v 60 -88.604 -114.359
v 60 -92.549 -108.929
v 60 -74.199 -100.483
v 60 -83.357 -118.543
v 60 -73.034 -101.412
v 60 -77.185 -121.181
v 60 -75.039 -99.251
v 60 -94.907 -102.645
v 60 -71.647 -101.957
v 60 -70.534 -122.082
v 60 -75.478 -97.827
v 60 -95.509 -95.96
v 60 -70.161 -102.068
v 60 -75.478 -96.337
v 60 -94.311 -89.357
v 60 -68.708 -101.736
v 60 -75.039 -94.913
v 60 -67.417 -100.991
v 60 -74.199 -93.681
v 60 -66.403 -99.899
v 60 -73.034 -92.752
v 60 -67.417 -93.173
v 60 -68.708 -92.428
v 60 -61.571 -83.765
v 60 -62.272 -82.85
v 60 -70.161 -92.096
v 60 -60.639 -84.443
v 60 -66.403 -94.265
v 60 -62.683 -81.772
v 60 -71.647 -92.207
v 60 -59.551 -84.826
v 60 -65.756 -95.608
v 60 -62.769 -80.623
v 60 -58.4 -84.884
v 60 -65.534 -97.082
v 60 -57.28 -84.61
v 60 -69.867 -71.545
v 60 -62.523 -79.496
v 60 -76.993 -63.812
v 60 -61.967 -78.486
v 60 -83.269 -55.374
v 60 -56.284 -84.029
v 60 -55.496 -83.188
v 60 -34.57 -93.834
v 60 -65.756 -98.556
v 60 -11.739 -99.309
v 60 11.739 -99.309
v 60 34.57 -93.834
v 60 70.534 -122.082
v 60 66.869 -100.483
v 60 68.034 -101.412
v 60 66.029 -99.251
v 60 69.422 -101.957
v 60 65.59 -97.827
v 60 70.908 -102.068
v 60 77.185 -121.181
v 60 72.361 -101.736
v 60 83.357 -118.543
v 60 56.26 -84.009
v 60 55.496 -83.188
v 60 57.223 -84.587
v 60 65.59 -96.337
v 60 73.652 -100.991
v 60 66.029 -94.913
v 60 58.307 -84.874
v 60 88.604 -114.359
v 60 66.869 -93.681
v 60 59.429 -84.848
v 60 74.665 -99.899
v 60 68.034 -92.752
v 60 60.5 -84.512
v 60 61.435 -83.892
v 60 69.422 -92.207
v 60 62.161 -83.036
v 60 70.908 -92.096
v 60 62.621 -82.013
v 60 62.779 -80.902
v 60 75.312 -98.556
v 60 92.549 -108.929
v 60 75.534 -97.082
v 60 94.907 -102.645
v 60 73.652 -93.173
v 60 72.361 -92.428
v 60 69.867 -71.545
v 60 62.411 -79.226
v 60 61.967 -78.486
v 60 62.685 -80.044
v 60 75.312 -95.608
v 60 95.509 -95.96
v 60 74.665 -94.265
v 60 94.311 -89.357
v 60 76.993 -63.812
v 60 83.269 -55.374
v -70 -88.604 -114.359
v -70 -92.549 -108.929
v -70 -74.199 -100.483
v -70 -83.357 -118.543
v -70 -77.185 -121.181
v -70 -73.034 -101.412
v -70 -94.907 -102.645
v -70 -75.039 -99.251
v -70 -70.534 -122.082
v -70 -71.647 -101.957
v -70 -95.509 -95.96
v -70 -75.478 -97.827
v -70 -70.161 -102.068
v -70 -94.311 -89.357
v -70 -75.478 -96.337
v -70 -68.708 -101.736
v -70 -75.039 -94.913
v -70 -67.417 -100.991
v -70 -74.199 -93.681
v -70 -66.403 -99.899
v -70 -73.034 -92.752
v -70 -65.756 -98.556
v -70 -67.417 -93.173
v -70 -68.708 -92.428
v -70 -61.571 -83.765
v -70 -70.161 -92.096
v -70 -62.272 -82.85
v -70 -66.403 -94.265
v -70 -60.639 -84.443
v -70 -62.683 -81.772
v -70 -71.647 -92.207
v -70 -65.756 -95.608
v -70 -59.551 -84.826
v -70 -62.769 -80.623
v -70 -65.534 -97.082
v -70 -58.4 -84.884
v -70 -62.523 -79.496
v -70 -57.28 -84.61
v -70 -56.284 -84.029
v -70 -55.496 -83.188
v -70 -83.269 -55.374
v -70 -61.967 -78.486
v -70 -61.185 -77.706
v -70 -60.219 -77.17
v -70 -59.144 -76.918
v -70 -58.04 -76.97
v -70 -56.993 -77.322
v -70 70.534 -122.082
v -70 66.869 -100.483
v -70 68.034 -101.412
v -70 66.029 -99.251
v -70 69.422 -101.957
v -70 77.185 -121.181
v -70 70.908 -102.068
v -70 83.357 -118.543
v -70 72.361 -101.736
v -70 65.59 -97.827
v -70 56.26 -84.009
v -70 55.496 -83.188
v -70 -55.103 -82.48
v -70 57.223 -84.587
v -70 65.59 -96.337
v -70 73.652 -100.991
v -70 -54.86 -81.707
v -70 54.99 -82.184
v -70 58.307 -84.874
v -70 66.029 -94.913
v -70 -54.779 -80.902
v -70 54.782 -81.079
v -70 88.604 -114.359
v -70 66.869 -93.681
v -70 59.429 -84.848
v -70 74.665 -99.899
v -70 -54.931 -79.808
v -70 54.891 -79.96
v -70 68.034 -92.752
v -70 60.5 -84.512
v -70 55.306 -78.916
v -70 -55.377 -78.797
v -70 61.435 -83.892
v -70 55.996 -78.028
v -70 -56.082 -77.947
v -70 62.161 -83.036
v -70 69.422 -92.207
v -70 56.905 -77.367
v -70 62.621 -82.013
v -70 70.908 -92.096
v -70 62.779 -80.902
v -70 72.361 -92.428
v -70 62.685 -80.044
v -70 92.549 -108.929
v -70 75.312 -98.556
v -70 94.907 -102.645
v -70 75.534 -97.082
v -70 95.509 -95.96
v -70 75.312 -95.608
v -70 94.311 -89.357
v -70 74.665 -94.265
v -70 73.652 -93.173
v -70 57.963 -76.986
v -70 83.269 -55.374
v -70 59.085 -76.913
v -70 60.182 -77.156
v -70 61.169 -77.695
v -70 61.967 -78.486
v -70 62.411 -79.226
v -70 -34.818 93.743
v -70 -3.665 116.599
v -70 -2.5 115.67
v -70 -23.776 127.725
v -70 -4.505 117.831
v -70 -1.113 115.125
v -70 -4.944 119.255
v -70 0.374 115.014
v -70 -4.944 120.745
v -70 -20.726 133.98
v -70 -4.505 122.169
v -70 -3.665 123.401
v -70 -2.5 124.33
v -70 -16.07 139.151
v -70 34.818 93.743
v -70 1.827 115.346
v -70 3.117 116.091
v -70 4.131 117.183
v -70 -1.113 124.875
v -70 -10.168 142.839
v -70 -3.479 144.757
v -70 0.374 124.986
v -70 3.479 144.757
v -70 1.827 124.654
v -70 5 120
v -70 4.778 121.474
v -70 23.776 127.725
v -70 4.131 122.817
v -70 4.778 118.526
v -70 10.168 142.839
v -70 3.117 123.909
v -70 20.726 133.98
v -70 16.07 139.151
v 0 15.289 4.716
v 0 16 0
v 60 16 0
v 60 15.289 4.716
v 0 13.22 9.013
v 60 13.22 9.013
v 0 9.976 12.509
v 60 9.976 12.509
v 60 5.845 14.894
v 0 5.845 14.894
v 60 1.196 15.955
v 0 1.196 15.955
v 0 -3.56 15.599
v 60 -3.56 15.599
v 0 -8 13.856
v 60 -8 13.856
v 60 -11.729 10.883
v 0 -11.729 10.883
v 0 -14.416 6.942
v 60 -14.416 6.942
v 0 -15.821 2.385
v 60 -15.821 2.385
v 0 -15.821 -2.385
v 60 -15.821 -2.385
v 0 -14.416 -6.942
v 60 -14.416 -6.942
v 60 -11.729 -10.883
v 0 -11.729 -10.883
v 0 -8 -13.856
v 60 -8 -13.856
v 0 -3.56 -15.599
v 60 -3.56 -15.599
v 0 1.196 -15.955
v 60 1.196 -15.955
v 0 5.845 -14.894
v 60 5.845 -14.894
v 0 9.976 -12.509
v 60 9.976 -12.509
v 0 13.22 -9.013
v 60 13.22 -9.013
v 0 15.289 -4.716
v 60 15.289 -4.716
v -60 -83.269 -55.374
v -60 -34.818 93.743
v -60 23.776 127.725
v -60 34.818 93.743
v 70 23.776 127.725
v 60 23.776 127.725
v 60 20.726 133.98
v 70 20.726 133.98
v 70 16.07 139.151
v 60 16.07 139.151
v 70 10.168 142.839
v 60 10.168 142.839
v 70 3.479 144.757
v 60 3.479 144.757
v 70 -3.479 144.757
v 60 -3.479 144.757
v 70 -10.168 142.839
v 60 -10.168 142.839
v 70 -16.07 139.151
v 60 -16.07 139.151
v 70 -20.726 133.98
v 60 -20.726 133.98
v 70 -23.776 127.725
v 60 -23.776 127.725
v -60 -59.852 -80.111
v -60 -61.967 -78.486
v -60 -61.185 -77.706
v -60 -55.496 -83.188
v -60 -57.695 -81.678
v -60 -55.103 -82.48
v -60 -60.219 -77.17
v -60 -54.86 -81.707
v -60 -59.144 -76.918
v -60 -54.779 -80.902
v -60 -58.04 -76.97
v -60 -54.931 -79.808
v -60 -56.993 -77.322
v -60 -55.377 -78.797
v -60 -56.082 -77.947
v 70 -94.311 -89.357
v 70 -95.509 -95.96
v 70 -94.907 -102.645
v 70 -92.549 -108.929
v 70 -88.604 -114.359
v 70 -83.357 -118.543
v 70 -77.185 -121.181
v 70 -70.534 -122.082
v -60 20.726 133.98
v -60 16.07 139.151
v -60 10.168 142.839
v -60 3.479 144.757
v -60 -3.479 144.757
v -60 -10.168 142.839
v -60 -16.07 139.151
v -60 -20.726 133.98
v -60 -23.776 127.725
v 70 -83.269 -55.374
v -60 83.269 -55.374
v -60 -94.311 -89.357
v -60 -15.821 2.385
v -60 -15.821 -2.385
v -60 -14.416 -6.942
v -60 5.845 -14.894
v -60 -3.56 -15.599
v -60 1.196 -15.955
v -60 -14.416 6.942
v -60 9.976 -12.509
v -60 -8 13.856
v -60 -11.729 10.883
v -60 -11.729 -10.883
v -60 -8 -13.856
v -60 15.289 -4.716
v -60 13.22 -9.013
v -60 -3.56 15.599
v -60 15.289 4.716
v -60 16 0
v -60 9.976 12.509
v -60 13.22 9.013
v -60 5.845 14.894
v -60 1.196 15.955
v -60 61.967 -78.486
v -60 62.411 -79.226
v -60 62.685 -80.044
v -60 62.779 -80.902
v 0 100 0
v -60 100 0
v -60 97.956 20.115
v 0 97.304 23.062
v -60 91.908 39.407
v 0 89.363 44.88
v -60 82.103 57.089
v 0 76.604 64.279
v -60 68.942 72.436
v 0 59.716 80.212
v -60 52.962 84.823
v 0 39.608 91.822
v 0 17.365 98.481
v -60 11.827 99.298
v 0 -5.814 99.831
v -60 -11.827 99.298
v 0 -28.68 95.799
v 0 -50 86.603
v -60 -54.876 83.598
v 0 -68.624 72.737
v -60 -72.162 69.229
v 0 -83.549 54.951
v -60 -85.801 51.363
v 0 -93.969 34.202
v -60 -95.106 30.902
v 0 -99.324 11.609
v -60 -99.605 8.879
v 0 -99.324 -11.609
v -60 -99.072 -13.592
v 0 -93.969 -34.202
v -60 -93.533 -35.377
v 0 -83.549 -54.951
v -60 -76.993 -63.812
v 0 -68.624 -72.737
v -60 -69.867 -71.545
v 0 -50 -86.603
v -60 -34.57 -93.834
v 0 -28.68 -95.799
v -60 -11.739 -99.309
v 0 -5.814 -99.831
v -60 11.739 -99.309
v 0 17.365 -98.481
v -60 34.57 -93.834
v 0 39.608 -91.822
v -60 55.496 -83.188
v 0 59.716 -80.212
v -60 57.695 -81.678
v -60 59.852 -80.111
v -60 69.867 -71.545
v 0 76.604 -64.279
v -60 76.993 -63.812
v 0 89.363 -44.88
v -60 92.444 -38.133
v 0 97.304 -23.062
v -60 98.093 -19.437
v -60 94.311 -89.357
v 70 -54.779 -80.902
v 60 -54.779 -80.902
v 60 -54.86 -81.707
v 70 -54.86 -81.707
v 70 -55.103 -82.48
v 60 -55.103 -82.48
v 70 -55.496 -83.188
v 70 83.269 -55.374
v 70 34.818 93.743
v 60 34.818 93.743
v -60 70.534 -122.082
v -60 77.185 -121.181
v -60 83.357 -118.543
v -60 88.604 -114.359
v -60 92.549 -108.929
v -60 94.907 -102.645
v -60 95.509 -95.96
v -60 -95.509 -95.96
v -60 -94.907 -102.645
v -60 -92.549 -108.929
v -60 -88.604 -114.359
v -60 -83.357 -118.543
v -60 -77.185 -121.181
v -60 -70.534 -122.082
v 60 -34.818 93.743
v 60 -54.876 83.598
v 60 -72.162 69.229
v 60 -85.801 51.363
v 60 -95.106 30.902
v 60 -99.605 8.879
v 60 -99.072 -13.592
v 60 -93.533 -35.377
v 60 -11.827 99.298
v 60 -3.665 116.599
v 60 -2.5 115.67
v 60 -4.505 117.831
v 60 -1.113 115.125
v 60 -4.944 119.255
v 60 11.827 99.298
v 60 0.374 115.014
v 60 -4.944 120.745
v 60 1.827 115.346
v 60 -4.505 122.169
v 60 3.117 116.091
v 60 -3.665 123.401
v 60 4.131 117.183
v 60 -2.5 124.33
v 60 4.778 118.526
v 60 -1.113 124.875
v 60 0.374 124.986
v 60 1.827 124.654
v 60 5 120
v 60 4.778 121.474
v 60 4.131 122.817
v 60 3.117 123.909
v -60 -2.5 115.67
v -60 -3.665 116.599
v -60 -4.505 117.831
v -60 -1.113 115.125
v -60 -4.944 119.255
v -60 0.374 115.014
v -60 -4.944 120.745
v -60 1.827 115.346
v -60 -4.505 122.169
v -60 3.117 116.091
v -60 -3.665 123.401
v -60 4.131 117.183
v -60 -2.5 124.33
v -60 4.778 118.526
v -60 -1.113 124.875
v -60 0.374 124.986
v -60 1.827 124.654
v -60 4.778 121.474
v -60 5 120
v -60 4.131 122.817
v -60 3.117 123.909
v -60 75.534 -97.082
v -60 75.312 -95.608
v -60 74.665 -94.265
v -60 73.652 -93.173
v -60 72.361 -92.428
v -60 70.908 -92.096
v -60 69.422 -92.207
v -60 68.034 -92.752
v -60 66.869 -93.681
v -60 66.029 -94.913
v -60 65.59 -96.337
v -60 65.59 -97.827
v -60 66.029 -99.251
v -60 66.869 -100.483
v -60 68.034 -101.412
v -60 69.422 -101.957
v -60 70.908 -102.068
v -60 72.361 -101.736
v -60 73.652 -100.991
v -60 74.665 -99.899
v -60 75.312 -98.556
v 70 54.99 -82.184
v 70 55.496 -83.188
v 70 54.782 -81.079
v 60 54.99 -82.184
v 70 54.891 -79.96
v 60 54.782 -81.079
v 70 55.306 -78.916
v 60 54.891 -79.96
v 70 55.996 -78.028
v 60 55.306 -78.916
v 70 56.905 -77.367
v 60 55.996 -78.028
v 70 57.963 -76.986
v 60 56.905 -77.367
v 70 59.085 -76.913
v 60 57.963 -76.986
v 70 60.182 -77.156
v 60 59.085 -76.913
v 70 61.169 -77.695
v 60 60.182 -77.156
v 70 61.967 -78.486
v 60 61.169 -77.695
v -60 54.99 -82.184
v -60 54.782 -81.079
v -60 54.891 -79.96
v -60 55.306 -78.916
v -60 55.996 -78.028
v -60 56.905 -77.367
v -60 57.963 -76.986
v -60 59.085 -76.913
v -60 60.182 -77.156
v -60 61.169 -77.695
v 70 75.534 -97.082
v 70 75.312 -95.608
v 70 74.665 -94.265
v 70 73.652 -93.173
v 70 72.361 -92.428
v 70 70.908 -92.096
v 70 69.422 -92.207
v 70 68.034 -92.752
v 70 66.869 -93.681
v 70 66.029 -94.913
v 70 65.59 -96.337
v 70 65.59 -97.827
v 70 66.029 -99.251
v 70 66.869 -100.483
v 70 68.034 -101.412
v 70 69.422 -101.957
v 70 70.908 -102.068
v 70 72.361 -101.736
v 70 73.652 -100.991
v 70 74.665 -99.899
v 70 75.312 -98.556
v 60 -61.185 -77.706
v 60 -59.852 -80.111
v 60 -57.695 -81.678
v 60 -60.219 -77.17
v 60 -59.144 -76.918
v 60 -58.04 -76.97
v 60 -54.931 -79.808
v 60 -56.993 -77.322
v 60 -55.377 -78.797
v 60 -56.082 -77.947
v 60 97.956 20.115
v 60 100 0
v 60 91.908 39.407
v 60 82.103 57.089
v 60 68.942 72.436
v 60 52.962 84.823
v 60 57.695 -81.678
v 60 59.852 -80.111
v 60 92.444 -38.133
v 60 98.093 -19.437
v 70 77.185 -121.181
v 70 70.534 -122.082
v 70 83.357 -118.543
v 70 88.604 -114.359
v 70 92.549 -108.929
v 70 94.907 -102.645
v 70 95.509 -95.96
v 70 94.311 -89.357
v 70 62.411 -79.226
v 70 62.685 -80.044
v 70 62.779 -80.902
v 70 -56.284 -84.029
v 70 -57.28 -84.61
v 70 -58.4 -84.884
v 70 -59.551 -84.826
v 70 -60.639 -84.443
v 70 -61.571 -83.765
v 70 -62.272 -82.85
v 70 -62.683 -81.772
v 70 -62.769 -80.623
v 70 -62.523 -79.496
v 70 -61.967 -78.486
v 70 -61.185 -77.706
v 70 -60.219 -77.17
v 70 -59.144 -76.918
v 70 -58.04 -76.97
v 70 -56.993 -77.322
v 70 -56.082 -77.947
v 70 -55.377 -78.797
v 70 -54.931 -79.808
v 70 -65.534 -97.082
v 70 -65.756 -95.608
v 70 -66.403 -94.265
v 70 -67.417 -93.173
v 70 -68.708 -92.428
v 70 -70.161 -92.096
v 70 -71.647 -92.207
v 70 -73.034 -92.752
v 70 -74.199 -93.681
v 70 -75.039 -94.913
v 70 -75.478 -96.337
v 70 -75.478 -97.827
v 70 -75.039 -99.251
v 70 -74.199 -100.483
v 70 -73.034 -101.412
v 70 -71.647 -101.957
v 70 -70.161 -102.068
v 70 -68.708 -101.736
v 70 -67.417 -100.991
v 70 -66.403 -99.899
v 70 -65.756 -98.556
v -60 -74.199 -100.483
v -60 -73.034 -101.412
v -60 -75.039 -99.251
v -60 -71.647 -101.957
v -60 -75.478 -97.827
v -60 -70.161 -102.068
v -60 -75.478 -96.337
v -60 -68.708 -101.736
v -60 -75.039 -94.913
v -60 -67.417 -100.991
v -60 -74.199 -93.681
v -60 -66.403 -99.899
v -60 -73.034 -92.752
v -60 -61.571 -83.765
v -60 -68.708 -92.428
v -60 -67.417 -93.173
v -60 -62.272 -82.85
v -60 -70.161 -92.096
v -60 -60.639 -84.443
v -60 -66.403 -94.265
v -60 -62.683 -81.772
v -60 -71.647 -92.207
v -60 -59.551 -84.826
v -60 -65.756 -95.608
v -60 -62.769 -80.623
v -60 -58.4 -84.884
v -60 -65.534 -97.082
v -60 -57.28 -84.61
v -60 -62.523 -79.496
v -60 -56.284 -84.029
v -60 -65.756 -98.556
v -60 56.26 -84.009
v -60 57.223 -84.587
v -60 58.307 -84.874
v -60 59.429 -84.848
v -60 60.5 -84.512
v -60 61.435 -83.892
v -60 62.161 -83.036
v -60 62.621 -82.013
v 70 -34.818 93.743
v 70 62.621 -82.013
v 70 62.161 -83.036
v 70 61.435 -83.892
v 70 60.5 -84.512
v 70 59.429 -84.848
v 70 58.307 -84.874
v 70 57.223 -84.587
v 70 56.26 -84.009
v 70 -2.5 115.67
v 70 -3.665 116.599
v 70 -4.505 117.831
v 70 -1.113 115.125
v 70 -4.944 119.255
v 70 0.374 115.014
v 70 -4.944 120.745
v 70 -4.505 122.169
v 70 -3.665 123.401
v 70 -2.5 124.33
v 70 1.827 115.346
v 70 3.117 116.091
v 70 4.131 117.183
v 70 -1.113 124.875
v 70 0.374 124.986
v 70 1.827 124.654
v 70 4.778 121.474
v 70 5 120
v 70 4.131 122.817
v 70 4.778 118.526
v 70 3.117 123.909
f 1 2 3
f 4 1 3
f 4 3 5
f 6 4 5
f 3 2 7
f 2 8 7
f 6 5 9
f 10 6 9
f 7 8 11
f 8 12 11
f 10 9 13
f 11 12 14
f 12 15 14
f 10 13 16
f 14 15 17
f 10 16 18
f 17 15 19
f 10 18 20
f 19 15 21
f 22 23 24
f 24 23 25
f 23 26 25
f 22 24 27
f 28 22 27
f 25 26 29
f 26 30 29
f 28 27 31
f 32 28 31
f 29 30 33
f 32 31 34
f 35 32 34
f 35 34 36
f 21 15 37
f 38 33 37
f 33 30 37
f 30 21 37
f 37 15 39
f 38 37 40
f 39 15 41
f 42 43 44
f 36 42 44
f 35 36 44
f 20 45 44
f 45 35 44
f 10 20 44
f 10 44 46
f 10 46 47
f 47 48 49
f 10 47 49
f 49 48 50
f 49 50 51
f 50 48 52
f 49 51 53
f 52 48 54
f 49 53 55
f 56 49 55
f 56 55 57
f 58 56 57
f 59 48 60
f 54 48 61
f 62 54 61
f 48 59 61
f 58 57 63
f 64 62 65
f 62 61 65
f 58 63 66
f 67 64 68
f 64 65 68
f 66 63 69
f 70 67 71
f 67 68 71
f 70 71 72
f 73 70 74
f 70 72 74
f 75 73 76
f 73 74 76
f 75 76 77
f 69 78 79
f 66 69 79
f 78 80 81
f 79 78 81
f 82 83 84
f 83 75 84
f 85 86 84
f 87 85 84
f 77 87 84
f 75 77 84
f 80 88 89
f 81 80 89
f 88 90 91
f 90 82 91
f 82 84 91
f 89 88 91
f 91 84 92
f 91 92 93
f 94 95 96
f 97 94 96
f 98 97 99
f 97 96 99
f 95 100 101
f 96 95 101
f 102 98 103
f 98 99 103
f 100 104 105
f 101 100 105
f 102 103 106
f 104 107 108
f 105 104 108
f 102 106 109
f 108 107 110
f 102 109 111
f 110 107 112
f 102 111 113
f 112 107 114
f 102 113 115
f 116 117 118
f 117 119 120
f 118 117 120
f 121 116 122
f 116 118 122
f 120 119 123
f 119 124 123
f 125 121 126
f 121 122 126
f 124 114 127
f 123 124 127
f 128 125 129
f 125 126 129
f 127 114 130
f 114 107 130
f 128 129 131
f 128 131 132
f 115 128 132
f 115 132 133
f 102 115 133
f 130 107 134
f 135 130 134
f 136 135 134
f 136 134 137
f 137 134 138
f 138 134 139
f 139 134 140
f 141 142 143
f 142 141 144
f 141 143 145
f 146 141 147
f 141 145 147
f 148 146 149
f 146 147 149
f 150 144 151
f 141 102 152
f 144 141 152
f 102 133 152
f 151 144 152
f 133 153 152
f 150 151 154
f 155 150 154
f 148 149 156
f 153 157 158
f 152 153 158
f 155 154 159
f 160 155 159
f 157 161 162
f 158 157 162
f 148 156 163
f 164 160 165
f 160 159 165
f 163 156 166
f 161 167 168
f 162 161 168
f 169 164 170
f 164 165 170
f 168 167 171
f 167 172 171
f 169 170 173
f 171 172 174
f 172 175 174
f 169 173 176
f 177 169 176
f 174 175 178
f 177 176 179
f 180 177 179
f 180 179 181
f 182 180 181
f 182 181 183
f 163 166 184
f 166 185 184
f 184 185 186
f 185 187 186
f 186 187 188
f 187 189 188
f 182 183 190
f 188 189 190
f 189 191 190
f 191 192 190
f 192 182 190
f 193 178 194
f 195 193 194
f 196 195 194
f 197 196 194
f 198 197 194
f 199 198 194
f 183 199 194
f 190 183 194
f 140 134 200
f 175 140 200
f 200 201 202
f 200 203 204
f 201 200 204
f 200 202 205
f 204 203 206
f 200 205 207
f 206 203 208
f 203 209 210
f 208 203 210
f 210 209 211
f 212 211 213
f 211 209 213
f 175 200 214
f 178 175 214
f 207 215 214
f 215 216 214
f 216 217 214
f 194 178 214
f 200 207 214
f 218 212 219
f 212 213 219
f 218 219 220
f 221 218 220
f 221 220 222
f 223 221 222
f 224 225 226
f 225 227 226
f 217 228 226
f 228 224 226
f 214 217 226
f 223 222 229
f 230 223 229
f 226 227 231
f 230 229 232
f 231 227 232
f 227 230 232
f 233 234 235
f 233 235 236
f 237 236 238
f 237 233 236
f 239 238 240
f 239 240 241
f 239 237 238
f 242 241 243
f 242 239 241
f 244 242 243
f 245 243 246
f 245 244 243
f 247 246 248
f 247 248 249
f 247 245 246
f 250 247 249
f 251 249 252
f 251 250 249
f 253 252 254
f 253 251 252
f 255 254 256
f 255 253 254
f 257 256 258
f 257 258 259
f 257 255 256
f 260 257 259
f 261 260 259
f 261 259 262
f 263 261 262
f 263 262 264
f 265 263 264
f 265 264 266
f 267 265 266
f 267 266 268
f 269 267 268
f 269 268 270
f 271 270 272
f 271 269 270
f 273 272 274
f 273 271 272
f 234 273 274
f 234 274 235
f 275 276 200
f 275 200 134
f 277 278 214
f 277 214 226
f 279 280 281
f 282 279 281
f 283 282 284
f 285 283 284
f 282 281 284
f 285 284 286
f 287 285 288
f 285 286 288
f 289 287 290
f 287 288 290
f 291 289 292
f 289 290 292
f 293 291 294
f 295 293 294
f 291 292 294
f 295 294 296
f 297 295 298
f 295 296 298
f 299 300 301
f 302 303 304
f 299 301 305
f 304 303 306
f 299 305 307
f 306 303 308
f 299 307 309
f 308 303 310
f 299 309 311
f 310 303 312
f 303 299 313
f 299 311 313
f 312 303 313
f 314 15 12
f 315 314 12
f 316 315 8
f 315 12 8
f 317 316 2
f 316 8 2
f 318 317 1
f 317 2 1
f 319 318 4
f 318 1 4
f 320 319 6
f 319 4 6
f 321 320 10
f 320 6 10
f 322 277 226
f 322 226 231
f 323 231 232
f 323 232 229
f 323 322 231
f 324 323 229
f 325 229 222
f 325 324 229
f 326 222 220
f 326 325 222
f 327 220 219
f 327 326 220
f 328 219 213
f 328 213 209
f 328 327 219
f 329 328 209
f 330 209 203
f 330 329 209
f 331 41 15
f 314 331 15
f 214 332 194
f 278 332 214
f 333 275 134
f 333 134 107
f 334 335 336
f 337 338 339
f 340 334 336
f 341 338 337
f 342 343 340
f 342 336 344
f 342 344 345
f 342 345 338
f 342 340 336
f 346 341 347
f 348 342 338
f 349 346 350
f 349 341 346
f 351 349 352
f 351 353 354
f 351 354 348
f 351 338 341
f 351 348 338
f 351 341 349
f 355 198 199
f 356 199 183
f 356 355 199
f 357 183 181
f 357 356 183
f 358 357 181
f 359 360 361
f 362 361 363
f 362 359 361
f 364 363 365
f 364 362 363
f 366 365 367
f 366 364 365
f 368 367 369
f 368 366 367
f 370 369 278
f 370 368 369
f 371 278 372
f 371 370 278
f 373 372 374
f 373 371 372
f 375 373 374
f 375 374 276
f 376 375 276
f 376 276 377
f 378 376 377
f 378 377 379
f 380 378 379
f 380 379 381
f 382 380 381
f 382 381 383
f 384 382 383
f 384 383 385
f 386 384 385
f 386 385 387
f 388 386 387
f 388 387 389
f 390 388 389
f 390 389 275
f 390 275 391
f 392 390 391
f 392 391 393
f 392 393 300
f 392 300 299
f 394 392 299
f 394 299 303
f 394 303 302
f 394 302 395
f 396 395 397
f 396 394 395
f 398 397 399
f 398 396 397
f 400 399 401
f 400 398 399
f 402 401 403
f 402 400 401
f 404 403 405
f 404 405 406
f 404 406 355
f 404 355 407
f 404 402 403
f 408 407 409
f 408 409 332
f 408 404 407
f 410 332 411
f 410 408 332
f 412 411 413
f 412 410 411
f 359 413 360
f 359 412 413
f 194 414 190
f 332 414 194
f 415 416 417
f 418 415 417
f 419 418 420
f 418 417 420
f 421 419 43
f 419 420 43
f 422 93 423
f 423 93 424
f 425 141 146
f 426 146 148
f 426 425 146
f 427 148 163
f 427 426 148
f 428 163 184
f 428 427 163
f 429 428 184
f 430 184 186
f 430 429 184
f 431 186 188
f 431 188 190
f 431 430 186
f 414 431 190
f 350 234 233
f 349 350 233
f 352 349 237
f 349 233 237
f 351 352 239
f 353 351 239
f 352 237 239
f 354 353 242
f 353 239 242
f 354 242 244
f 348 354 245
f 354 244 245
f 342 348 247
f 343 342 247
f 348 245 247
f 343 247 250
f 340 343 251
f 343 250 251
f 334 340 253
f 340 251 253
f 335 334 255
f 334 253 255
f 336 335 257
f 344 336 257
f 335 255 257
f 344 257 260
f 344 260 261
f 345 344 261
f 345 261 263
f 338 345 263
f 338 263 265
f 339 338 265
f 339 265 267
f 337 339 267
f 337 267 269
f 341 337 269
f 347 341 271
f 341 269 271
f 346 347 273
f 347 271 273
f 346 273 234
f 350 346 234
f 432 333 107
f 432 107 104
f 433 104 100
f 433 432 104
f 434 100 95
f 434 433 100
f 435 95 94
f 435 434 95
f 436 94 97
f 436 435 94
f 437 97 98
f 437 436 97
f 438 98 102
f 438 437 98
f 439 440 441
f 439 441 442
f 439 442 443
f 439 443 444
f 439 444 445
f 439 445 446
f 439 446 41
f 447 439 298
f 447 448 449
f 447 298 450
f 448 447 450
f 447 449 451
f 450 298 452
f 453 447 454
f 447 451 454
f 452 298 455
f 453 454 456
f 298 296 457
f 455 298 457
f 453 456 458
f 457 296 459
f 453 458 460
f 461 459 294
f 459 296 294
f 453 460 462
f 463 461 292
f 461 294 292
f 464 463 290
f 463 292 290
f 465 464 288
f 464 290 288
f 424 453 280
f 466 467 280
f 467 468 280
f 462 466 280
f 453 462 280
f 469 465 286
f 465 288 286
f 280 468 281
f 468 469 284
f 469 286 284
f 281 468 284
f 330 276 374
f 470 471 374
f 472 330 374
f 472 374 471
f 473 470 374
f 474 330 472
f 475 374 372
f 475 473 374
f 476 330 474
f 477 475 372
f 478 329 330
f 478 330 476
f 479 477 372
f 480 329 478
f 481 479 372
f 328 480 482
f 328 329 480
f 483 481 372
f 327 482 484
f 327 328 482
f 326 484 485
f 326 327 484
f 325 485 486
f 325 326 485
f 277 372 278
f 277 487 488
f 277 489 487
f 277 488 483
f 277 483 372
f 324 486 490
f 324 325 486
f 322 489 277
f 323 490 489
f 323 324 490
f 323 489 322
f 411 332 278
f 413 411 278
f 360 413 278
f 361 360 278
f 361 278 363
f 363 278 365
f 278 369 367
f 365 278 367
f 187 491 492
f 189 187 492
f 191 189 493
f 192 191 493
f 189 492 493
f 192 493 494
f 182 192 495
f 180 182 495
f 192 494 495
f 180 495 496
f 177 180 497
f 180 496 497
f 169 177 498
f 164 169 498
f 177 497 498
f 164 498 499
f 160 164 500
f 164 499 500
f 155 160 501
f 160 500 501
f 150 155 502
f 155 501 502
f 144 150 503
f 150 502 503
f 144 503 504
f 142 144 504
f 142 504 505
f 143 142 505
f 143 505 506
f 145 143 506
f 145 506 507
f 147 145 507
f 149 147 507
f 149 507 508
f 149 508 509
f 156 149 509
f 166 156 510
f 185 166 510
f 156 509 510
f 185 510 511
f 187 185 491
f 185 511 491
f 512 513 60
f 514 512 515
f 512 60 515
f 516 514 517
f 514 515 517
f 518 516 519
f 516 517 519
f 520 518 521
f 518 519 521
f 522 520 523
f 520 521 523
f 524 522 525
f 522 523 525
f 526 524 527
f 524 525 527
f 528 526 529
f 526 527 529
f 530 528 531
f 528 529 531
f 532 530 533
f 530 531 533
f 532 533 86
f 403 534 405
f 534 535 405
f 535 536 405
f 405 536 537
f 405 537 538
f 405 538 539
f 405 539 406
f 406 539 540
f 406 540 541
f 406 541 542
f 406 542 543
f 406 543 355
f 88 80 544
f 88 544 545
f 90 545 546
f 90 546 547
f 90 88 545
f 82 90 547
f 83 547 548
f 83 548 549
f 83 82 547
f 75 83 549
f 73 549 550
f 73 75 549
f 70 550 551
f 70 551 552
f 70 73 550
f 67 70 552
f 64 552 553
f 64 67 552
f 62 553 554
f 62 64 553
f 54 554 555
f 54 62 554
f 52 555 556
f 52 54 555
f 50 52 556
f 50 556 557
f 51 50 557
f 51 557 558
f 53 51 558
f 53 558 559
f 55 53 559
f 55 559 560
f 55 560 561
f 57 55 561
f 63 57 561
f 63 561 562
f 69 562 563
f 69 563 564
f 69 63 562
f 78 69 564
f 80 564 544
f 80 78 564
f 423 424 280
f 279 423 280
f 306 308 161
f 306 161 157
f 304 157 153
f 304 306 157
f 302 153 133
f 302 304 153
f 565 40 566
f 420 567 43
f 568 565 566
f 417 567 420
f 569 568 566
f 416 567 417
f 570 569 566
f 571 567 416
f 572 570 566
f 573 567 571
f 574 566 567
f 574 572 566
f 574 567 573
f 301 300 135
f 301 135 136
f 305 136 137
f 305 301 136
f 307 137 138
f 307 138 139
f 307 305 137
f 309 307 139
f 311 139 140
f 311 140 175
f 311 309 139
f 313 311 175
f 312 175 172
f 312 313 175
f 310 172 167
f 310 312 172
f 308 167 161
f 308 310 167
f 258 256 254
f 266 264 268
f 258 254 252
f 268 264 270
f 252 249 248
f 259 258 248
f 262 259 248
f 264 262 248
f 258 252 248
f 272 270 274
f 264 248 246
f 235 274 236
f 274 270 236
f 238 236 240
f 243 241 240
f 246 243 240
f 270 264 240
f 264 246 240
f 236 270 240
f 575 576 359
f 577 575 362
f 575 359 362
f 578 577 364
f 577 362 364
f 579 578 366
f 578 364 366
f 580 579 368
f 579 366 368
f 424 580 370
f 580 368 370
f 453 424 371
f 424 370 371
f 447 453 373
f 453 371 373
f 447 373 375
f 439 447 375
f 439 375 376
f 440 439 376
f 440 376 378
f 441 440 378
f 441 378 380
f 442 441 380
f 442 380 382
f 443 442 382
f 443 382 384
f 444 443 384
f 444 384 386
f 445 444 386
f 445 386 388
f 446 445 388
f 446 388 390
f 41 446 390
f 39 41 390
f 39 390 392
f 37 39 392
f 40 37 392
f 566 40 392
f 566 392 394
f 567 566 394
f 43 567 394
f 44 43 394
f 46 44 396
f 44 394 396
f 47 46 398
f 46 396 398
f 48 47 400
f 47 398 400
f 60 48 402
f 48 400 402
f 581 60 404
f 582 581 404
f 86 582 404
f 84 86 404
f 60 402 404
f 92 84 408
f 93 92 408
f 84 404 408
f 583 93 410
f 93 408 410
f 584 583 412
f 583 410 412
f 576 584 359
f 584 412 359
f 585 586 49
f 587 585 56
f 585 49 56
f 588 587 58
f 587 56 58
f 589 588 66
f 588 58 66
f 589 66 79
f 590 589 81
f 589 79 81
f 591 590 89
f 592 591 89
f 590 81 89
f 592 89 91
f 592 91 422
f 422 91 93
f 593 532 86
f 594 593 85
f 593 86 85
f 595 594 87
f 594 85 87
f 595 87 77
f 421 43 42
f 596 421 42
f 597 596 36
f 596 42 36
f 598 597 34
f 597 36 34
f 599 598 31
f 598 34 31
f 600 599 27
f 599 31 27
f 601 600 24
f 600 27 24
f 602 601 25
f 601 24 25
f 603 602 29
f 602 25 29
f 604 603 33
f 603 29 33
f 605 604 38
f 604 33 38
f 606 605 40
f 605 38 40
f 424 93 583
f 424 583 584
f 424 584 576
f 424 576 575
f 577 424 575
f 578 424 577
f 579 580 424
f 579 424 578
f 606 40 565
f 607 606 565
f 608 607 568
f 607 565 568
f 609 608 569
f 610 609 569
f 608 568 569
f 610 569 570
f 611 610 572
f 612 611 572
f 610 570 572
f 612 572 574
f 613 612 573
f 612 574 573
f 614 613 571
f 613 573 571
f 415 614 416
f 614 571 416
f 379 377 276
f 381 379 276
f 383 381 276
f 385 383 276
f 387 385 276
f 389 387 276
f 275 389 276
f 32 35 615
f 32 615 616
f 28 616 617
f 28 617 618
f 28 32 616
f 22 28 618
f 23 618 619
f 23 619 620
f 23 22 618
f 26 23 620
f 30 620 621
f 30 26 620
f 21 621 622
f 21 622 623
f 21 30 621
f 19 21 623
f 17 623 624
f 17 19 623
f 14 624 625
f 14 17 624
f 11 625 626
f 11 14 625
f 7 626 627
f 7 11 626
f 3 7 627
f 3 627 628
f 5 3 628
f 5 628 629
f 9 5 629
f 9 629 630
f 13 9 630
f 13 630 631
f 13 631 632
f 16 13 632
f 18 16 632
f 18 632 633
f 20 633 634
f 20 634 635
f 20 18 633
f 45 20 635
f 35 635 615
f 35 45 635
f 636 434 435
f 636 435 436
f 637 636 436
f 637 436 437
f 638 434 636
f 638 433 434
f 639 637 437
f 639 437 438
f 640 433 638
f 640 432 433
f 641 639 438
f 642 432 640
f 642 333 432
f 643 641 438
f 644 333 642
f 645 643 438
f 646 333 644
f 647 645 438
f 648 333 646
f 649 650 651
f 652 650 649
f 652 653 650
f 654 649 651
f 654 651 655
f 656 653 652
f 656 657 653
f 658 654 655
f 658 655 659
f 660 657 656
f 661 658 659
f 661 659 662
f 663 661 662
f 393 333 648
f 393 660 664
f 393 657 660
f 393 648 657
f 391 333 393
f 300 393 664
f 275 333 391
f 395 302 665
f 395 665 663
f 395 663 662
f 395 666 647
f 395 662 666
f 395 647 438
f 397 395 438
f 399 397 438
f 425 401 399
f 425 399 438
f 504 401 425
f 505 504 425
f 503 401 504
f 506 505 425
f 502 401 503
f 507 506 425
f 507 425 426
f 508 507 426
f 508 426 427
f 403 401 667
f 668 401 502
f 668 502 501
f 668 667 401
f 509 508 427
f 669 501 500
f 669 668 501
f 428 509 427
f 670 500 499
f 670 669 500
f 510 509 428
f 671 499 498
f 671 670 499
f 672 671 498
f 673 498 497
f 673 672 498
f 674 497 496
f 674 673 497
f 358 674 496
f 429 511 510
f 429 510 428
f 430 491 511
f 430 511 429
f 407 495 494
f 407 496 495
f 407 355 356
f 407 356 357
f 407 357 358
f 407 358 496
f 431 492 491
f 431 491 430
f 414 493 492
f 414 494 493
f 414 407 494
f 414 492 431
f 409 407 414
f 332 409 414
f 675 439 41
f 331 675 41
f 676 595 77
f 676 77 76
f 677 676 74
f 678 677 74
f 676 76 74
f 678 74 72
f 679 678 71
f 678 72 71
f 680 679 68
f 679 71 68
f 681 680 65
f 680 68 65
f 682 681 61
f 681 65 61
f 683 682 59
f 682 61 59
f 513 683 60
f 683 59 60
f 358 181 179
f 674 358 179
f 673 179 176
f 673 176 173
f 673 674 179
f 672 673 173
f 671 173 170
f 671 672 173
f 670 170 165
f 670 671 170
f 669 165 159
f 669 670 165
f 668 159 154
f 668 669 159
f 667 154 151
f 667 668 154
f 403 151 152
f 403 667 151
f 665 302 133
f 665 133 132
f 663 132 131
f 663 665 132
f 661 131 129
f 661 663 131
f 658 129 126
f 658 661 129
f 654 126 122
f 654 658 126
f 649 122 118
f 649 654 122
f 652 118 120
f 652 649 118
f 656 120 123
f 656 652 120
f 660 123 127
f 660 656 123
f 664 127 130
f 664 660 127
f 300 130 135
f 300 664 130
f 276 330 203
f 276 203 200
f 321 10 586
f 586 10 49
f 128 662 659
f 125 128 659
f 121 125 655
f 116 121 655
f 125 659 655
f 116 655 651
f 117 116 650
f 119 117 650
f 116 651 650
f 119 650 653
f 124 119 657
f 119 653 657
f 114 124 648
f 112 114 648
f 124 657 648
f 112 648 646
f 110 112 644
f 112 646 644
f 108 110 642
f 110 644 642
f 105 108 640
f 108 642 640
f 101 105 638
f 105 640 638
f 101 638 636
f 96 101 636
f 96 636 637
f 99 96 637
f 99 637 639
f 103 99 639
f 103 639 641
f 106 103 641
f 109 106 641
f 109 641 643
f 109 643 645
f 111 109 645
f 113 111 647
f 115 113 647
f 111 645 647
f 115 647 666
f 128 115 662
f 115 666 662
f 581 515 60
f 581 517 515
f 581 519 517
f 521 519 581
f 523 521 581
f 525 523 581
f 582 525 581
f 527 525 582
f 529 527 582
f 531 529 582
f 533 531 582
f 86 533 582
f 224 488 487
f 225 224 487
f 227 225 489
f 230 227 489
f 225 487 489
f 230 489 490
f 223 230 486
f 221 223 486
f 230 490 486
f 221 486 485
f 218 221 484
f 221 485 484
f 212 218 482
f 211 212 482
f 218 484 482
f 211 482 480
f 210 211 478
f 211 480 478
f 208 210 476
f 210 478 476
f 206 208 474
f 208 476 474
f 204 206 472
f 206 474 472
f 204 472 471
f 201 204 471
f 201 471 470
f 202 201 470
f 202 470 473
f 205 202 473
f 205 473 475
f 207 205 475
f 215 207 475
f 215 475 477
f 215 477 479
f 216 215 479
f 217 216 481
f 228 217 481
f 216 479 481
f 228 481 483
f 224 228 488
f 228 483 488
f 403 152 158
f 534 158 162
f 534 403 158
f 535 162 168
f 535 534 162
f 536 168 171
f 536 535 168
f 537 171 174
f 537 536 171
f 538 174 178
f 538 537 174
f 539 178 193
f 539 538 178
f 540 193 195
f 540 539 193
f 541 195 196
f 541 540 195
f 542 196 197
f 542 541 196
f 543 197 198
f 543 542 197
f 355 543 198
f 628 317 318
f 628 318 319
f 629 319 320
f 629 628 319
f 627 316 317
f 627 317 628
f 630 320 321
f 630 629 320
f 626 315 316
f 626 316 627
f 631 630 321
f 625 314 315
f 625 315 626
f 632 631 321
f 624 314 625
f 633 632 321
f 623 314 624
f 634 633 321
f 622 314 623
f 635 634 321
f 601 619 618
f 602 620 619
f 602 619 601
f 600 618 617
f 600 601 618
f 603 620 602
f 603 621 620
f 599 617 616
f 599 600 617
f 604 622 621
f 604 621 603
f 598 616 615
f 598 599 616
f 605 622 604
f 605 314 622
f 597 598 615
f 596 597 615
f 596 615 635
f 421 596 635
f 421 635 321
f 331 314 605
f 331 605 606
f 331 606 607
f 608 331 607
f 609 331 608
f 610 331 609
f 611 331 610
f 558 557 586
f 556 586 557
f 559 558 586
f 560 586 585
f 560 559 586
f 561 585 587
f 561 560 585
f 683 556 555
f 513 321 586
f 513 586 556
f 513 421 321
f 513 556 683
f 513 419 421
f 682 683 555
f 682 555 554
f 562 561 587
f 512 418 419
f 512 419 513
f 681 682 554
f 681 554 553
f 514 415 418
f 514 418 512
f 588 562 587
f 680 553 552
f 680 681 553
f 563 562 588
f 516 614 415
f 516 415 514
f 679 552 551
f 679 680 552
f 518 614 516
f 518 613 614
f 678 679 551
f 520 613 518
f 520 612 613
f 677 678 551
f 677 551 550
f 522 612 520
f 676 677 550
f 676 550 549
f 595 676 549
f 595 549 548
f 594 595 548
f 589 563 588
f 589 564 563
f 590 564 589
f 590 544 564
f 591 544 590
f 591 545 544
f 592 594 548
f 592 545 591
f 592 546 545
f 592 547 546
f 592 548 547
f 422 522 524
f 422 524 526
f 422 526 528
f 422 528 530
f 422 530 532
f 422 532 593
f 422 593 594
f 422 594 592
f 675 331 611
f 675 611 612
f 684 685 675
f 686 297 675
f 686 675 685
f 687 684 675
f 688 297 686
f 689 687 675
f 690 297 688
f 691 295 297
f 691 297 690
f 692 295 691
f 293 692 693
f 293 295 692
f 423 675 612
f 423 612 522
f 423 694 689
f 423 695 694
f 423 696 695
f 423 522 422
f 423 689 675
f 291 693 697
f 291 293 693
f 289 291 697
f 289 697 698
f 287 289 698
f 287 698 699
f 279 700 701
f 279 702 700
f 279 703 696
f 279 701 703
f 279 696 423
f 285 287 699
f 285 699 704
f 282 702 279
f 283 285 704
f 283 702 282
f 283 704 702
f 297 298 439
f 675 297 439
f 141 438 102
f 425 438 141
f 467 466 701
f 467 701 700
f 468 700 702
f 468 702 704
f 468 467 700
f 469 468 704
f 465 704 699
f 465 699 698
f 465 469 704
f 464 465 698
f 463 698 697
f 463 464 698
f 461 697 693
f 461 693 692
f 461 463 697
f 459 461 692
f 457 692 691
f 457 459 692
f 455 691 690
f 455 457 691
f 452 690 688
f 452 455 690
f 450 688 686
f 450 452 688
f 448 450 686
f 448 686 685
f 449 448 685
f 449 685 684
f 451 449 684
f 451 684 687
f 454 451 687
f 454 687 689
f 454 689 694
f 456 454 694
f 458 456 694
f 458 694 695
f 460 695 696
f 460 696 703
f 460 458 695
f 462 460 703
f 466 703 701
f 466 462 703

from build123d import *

# Parameters (mm, degrees)
F0_R     = 100
F0_R_2   = 16
F1_DEPTH = 60
F2_R     = 5
F2_R_2   = 16
F3_DEPTH = 10


with BuildPart() as f1:
    # F0 (on Right) → F1 (new body)
    with BuildSketch(Plane.YZ):
        Circle(F0_R)
        Circle(F0_R_2, mode=Mode.SUBTRACT)
    extrude(amount=F1_DEPTH)

    # F2 (on face) → F3 (join)
    with BuildSketch(Plane.YZ.offset(60)):
        with BuildLine():
            Line((-83.269003, -55.37394), (-94.310643, -89.356614))
            ThreePointArc((-94.310643, -89.356614), (-90.759655, -111.776671), (-70.53423, -122.082039))
            Line((-70.53423, -122.082039), (70.53423, -122.082039))
            ThreePointArc((70.53423, -122.082039), (90.759655, -111.776671), (94.310643, -89.356614))
            Line((94.310643, -89.356614), (83.269003, -55.37394))
            ThreePointArc((83.269003, -55.37394), (73.531721, -67.772311), (61.966923, -78.486307))
            ThreePointArc((61.966923, -78.486307), (62.5702, -79.627649), (62.778525, -80.901699))
            ThreePointArc((62.778525, -80.901699), (59.976487, -84.718097), (55.496082, -83.187649))
            ThreePointArc((55.496082, -83.187649), (0, -100), (-55.496082, -83.187649))
            ThreePointArc((-55.496082, -83.187649), (-61.129666, -84.137767), (-61.966923, -78.486307))
            ThreePointArc((-61.966923, -78.486307), (-73.531721, -67.772311), (-83.269003, -55.37394))
        make_face()
        with Locations((-70.53423, -97.082039)):
            Circle(F2_R, mode=Mode.SUBTRACT)
        with Locations((70.53423, -97.082039)):
            Circle(F2_R, mode=Mode.SUBTRACT)
        with BuildLine():
            Line((-34.818053, 93.74275), (-83.269003, -55.37394))
            ThreePointArc((-83.269003, -55.37394), (-73.531721, -67.772311), (-61.966923, -78.486307))
            ThreePointArc((-61.966923, -78.486307), (-57.504475, -77.110025), (-54.778525, -80.901699))
            ThreePointArc((-54.778525, -80.901699), (-54.962128, -82.099661), (-55.496082, -83.187649))
            ThreePointArc((-55.496082, -83.187649), (0, -100), (55.496082, -83.187649))
            ThreePointArc((55.496082, -83.187649), (56.427384, -77.665631), (61.966923, -78.486307))
            ThreePointArc((61.966923, -78.486307), (73.531721, -67.772311), (83.269003, -55.37394))
            Line((83.269003, -55.37394), (34.818053, 93.74275))
            ThreePointArc((34.818053, 93.74275), (0, 100), (-34.818053, 93.74275))
        make_face()
        Circle(F2_R_2, mode=Mode.SUBTRACT)
        with BuildLine():
            Line((-23.776413, 127.725425), (-34.818053, 93.74275))
            ThreePointArc((-34.818053, 93.74275), (0, 100), (34.818053, 93.74275))
            Line((34.818053, 93.74275), (23.776413, 127.725425))
            ThreePointArc((23.776413, 127.725425), (0, 145), (-23.776413, 127.725425))
        make_face()
        with Locations((0, 120)):
            Circle(F2_R, mode=Mode.SUBTRACT)
        Circle(F2_R_2)
    extrude(amount=F3_DEPTH)

    # F4: F1 across face


with BuildPart() as f1_1:
    add(f1.part)
    add(f1.part.mirror(Plane(origin=(0, 0, 0), x_dir=(0, 1, 0), z_dir=(-1, 0, 0))))


solid = f1_1.part
